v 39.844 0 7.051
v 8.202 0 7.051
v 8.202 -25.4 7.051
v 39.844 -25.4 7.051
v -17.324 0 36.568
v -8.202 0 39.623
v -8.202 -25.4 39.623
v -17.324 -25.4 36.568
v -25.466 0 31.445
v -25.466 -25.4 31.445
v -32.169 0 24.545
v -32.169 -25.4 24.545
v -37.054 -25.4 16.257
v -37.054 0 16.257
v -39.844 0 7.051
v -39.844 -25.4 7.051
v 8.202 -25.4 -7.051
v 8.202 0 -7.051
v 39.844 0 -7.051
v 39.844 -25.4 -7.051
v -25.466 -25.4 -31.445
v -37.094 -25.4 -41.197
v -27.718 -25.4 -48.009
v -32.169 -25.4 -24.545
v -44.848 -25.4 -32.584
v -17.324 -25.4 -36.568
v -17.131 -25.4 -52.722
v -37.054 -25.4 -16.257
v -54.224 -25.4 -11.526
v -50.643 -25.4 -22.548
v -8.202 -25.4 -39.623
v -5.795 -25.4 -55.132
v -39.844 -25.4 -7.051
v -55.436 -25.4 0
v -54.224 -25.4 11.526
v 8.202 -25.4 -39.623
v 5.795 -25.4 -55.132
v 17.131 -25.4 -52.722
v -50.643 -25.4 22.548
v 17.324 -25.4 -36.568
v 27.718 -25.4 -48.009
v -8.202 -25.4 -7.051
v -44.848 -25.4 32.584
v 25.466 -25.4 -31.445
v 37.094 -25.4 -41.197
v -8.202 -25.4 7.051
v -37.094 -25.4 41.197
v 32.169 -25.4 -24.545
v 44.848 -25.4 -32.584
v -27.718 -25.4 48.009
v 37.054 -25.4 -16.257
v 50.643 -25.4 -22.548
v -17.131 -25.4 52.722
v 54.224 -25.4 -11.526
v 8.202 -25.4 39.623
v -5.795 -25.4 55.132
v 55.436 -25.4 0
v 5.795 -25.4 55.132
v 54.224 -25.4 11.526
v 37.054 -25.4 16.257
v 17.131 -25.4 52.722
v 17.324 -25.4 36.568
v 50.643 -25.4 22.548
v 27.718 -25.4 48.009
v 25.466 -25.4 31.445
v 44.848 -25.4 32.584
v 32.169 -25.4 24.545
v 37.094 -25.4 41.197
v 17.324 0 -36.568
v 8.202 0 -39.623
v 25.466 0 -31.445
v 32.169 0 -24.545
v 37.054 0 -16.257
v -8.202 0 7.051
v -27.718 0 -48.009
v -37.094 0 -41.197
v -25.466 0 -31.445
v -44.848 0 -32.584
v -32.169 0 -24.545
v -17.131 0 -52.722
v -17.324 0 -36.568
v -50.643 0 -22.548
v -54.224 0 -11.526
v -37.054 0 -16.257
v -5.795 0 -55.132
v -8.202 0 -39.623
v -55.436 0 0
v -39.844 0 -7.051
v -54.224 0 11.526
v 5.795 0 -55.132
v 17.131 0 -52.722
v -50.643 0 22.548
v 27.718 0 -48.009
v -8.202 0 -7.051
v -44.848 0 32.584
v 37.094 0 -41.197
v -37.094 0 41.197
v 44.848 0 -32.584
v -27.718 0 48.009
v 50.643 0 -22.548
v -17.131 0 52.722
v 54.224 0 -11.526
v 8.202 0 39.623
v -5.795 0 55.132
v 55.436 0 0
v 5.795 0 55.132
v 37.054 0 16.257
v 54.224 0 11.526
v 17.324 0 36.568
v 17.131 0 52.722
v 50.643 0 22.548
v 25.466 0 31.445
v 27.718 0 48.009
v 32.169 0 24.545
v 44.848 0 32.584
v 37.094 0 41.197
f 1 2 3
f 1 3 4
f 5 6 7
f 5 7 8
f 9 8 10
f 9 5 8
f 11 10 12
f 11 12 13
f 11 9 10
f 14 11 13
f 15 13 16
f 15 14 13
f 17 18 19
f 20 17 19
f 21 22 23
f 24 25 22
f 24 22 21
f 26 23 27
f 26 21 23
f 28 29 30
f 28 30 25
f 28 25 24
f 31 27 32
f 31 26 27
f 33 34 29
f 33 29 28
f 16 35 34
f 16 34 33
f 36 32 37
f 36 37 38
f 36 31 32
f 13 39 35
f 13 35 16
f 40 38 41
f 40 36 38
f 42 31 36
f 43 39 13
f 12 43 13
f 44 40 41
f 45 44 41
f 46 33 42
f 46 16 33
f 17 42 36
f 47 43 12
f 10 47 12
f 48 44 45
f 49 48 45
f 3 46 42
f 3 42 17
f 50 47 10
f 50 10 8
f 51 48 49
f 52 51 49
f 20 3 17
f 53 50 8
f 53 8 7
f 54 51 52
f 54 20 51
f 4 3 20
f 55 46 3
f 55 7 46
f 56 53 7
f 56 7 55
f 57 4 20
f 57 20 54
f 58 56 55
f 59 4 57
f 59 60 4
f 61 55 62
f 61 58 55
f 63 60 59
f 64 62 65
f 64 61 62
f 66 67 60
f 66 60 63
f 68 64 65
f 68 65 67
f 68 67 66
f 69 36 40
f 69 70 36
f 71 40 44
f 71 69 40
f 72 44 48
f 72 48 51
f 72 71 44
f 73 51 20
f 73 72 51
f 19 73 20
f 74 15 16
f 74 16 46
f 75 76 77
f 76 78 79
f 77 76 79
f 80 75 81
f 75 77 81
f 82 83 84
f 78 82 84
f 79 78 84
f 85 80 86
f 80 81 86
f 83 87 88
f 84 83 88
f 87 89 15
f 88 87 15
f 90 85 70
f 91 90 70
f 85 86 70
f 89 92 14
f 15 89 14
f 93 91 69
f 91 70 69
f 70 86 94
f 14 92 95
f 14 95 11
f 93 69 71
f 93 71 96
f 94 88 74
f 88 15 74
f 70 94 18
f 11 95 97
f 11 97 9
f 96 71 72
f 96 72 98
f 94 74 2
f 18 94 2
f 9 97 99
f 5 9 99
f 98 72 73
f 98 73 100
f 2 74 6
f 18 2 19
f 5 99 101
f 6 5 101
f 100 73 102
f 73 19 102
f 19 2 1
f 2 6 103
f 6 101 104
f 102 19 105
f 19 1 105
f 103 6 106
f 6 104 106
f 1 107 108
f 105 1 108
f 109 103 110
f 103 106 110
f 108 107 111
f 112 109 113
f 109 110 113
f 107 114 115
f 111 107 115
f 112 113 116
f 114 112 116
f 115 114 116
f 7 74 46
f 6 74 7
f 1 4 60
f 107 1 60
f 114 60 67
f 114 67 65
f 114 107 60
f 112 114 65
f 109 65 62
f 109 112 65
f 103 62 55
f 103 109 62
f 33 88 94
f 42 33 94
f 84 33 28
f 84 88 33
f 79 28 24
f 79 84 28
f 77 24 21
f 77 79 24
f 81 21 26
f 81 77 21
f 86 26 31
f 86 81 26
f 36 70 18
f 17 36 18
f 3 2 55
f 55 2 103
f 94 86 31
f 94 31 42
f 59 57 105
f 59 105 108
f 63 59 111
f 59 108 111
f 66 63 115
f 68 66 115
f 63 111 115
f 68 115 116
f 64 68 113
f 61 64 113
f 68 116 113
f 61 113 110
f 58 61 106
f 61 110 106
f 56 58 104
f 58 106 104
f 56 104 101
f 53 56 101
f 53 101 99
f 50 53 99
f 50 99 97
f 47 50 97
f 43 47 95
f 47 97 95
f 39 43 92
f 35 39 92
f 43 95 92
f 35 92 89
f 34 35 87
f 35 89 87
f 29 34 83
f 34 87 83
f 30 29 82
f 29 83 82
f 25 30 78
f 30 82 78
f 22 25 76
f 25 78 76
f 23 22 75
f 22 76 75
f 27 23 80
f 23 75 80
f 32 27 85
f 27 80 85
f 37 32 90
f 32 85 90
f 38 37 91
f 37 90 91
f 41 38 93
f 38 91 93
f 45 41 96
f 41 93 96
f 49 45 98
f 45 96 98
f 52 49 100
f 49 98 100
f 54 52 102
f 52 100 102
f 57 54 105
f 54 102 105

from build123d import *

# Parameters (mm, degrees)
F0_R     = 55.435679
F0_R_2   = 40.463585
F1_DEPTH = 25.4
F2_W     = 85.478314
F2_H     = 14.102482
F3_DEPTH = 25.4
F4_W     = 16.404928
F4_H     = 86.62954
F5_DEPTH = 25.4


with BuildPart() as f1:
    # F0 (on Front) → F1 (new body)
    with BuildSketch(Plane.XZ):
        Circle(F0_R)
        Circle(F0_R_2, mode=Mode.SUBTRACT)
    extrude(amount=F1_DEPTH)

    # F2 (on Front) → F3 (join)
    with BuildSketch(Plane.XZ):
        Rectangle(F2_W, F2_H)
    extrude(amount=F3_DEPTH)

    # F4 (on Front) → F5 (join)
    with BuildSketch(Plane.XZ):
        Rectangle(F4_W, F4_H)
    extrude(amount=F5_DEPTH)


solid = f1.part
